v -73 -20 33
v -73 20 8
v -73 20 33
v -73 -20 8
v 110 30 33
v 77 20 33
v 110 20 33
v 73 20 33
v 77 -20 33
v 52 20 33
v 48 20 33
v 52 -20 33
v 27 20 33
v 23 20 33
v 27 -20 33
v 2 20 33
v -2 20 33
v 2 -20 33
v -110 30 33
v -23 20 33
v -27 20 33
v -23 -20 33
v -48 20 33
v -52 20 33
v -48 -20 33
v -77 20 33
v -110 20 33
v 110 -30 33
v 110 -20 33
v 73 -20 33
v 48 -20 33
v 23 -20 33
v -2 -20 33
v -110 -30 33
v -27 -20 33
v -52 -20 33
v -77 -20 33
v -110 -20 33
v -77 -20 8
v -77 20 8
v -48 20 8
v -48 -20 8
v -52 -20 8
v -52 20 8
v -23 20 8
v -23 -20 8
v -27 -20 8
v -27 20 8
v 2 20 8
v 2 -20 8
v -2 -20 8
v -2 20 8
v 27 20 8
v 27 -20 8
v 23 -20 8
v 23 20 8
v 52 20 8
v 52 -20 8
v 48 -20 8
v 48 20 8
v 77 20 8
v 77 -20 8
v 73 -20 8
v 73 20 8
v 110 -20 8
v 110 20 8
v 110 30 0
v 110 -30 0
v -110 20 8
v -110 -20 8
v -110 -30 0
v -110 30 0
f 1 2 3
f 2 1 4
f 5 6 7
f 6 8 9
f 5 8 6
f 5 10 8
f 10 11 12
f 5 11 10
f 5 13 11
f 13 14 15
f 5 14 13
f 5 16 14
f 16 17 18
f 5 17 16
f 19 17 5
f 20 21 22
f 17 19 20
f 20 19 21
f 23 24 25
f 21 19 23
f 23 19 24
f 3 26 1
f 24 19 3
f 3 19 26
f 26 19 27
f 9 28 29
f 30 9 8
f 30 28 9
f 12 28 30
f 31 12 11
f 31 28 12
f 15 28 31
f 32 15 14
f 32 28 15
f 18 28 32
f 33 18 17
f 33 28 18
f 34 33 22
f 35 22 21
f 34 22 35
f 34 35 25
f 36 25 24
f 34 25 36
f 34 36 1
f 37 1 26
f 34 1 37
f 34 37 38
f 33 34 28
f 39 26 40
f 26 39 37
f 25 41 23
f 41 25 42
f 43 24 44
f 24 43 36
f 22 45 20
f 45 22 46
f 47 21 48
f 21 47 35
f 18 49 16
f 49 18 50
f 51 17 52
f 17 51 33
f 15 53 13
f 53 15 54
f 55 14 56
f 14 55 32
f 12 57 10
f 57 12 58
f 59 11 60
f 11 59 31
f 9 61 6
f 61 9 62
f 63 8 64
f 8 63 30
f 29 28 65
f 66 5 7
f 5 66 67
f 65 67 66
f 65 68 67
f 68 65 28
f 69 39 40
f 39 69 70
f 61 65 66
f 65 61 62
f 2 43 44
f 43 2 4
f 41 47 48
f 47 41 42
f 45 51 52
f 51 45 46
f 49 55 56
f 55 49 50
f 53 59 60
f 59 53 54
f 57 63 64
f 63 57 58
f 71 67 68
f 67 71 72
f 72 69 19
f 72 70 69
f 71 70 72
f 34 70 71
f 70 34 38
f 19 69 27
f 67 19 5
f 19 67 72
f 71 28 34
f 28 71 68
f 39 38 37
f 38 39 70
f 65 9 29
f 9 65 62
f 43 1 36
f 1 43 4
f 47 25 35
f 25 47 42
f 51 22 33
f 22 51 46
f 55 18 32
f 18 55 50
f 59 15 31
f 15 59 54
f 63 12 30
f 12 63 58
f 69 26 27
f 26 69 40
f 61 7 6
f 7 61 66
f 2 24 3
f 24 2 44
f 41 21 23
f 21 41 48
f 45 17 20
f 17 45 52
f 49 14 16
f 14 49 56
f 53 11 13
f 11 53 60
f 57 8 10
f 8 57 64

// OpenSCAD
$fn = 32;

// ----------------------------------------------------------------------
// Rib frame 220 x 60 x 33
// 7 ribs at 25 mm pitch
// ----------------------------------------------------------------------

// --- parameters (mm) ---
frame = [220, 60, 8];  // base plate size (x, y, z)
rail_w = 10;           // side rail width
ribs = 7;              // number of ribs
rib_t = 4;             // rib thickness
rib_h = 25;            // rib height above the base plate
pitch = 25;            // pitch between rib centres

// --- derived feature positions (mm) ---
span = (ribs - 1) * pitch;          // = 150   distance between the outer ribs
origin_x = -span / 2;               // = -75   X of the first rib
rib_len = frame[1] - 2 * rail_w + 2;  // = 42   rib length, 1 mm into each rail
feature_centers = [
  [origin_x + 0 * pitch, 0],
  [origin_x + 1 * pitch, 0],
  [origin_x + 2 * pitch, 0],
  [origin_x + 3 * pitch, 0],
  [origin_x + 4 * pitch, 0],
  [origin_x + 5 * pitch, 0],
  [origin_x + 6 * pitch, 0]
];   // rib centre line, drives the rib loop

// base plate, two side rails, then the ribs read straight off feature_centers
union() {
  translate([-frame[0] / 2, -frame[1] / 2, 0]) cube(frame);
  translate([-frame[0] / 2, -frame[1] / 2, 0]) cube([frame[0], rail_w, frame[2] + rib_h]);
  translate([-frame[0] / 2, frame[1] / 2 - rail_w, 0]) cube([frame[0], rail_w, frame[2] + rib_h]);
  for (centre = feature_centers)
    translate([centre[0] - rib_t / 2, centre[1] - rib_len / 2, frame[2] - 1])
      cube([rib_t, rib_len, rib_h + 1]);
}
